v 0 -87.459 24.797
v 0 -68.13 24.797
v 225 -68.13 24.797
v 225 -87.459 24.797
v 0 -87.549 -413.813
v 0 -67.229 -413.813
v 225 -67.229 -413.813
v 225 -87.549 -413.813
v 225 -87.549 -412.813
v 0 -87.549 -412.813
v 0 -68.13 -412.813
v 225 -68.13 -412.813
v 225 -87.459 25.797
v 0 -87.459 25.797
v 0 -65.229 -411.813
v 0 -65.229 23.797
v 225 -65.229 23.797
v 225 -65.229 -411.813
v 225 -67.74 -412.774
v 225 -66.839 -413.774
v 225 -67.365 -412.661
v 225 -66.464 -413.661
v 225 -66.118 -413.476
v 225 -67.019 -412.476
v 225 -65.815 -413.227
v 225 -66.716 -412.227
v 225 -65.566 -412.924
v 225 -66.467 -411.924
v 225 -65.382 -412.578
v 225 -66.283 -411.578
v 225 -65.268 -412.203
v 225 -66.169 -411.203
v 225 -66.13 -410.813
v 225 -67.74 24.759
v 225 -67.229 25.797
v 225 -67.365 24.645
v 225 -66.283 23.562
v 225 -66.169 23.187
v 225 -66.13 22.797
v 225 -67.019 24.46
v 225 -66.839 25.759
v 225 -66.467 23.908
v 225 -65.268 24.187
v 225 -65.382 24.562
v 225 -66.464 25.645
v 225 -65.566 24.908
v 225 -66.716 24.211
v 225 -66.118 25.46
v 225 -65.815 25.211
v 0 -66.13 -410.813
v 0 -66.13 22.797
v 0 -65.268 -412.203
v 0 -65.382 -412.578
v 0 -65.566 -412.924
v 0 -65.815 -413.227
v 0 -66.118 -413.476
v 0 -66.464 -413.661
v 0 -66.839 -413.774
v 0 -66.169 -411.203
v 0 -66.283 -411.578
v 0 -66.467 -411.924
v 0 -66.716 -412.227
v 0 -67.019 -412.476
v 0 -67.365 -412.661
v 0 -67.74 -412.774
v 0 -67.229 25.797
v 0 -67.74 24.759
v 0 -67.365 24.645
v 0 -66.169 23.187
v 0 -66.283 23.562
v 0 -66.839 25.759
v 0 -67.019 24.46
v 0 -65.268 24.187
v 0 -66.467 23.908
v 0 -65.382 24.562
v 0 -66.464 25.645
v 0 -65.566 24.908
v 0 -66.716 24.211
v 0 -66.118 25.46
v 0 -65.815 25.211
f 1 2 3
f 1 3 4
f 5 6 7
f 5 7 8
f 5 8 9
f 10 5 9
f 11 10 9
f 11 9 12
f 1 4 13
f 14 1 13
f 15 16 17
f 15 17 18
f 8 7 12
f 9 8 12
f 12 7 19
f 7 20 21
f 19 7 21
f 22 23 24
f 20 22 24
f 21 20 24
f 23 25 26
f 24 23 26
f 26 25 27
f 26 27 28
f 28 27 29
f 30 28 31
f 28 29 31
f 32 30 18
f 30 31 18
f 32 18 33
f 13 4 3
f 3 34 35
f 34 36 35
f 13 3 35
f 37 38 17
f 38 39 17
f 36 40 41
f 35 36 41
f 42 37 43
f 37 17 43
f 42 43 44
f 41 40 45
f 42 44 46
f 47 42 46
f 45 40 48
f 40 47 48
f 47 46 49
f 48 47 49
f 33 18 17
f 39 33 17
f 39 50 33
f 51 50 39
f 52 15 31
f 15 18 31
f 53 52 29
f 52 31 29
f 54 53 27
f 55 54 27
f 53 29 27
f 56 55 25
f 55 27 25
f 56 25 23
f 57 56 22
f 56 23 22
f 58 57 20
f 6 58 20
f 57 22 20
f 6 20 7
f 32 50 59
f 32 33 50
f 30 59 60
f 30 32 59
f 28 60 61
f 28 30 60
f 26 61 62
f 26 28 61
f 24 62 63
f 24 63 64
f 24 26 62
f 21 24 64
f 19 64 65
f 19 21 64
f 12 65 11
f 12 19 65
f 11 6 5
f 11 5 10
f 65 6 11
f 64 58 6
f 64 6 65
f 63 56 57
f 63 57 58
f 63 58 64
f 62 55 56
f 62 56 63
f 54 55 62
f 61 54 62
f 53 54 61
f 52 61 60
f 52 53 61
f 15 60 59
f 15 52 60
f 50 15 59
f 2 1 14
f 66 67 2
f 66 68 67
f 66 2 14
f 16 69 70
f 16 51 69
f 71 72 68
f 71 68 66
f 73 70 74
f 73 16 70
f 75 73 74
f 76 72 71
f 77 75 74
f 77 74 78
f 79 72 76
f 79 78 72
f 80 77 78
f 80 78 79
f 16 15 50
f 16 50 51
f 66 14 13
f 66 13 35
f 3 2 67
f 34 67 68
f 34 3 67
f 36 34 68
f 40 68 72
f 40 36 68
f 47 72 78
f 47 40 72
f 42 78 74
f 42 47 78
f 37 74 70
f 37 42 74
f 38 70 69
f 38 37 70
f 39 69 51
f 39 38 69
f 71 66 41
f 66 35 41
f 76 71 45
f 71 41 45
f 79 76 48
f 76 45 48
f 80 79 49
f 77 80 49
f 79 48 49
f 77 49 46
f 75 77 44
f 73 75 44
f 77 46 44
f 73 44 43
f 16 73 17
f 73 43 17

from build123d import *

# Parameters (mm, degrees)
BOSS_EXTRUDE1_DEPTH = 225
FILLET1_R           = 2
FILLET2_R           = 2


with BuildPart() as part:
    # Sketch1 → Boss-Extrude1 (new body)
    with BuildSketch(Plane(origin=(0, 0, 0), x_dir=(0, 0, -1), z_dir=(1, 0, 0))):
        Polygon((-25.797072277, -87.459332388), (-25.797072277, -65.229332388), (413.812927723, -65.229332388), (413.812927723, -87.549332388), (412.812927723, -87.549332388), (412.812927723, -66.130301409), (-24.797072277, -66.130301409), (-24.797072277, -87.459332388), align=None)
    extrude(amount=BOSS_EXTRUDE1_DEPTH)

    # Fillet1
    fillet1_edges = [part.edges().sort_by_distance(p)[0] for p in [
        (112.5, -65.229332388, 25.797072277),
        (112.5, -65.229332388, -413.812927723),
    ]]
    fillet(fillet1_edges, radius=FILLET1_R)

    # Fillet2
    fillet2_edges = [part.edges().sort_by_distance(p)[0] for p in [
        (112.5, -66.130301409, -412.812927723),
        (112.5, -66.130301409, 24.797072277),
    ]]
    fillet(fillet2_edges, radius=FILLET2_R)


solid = part.part
